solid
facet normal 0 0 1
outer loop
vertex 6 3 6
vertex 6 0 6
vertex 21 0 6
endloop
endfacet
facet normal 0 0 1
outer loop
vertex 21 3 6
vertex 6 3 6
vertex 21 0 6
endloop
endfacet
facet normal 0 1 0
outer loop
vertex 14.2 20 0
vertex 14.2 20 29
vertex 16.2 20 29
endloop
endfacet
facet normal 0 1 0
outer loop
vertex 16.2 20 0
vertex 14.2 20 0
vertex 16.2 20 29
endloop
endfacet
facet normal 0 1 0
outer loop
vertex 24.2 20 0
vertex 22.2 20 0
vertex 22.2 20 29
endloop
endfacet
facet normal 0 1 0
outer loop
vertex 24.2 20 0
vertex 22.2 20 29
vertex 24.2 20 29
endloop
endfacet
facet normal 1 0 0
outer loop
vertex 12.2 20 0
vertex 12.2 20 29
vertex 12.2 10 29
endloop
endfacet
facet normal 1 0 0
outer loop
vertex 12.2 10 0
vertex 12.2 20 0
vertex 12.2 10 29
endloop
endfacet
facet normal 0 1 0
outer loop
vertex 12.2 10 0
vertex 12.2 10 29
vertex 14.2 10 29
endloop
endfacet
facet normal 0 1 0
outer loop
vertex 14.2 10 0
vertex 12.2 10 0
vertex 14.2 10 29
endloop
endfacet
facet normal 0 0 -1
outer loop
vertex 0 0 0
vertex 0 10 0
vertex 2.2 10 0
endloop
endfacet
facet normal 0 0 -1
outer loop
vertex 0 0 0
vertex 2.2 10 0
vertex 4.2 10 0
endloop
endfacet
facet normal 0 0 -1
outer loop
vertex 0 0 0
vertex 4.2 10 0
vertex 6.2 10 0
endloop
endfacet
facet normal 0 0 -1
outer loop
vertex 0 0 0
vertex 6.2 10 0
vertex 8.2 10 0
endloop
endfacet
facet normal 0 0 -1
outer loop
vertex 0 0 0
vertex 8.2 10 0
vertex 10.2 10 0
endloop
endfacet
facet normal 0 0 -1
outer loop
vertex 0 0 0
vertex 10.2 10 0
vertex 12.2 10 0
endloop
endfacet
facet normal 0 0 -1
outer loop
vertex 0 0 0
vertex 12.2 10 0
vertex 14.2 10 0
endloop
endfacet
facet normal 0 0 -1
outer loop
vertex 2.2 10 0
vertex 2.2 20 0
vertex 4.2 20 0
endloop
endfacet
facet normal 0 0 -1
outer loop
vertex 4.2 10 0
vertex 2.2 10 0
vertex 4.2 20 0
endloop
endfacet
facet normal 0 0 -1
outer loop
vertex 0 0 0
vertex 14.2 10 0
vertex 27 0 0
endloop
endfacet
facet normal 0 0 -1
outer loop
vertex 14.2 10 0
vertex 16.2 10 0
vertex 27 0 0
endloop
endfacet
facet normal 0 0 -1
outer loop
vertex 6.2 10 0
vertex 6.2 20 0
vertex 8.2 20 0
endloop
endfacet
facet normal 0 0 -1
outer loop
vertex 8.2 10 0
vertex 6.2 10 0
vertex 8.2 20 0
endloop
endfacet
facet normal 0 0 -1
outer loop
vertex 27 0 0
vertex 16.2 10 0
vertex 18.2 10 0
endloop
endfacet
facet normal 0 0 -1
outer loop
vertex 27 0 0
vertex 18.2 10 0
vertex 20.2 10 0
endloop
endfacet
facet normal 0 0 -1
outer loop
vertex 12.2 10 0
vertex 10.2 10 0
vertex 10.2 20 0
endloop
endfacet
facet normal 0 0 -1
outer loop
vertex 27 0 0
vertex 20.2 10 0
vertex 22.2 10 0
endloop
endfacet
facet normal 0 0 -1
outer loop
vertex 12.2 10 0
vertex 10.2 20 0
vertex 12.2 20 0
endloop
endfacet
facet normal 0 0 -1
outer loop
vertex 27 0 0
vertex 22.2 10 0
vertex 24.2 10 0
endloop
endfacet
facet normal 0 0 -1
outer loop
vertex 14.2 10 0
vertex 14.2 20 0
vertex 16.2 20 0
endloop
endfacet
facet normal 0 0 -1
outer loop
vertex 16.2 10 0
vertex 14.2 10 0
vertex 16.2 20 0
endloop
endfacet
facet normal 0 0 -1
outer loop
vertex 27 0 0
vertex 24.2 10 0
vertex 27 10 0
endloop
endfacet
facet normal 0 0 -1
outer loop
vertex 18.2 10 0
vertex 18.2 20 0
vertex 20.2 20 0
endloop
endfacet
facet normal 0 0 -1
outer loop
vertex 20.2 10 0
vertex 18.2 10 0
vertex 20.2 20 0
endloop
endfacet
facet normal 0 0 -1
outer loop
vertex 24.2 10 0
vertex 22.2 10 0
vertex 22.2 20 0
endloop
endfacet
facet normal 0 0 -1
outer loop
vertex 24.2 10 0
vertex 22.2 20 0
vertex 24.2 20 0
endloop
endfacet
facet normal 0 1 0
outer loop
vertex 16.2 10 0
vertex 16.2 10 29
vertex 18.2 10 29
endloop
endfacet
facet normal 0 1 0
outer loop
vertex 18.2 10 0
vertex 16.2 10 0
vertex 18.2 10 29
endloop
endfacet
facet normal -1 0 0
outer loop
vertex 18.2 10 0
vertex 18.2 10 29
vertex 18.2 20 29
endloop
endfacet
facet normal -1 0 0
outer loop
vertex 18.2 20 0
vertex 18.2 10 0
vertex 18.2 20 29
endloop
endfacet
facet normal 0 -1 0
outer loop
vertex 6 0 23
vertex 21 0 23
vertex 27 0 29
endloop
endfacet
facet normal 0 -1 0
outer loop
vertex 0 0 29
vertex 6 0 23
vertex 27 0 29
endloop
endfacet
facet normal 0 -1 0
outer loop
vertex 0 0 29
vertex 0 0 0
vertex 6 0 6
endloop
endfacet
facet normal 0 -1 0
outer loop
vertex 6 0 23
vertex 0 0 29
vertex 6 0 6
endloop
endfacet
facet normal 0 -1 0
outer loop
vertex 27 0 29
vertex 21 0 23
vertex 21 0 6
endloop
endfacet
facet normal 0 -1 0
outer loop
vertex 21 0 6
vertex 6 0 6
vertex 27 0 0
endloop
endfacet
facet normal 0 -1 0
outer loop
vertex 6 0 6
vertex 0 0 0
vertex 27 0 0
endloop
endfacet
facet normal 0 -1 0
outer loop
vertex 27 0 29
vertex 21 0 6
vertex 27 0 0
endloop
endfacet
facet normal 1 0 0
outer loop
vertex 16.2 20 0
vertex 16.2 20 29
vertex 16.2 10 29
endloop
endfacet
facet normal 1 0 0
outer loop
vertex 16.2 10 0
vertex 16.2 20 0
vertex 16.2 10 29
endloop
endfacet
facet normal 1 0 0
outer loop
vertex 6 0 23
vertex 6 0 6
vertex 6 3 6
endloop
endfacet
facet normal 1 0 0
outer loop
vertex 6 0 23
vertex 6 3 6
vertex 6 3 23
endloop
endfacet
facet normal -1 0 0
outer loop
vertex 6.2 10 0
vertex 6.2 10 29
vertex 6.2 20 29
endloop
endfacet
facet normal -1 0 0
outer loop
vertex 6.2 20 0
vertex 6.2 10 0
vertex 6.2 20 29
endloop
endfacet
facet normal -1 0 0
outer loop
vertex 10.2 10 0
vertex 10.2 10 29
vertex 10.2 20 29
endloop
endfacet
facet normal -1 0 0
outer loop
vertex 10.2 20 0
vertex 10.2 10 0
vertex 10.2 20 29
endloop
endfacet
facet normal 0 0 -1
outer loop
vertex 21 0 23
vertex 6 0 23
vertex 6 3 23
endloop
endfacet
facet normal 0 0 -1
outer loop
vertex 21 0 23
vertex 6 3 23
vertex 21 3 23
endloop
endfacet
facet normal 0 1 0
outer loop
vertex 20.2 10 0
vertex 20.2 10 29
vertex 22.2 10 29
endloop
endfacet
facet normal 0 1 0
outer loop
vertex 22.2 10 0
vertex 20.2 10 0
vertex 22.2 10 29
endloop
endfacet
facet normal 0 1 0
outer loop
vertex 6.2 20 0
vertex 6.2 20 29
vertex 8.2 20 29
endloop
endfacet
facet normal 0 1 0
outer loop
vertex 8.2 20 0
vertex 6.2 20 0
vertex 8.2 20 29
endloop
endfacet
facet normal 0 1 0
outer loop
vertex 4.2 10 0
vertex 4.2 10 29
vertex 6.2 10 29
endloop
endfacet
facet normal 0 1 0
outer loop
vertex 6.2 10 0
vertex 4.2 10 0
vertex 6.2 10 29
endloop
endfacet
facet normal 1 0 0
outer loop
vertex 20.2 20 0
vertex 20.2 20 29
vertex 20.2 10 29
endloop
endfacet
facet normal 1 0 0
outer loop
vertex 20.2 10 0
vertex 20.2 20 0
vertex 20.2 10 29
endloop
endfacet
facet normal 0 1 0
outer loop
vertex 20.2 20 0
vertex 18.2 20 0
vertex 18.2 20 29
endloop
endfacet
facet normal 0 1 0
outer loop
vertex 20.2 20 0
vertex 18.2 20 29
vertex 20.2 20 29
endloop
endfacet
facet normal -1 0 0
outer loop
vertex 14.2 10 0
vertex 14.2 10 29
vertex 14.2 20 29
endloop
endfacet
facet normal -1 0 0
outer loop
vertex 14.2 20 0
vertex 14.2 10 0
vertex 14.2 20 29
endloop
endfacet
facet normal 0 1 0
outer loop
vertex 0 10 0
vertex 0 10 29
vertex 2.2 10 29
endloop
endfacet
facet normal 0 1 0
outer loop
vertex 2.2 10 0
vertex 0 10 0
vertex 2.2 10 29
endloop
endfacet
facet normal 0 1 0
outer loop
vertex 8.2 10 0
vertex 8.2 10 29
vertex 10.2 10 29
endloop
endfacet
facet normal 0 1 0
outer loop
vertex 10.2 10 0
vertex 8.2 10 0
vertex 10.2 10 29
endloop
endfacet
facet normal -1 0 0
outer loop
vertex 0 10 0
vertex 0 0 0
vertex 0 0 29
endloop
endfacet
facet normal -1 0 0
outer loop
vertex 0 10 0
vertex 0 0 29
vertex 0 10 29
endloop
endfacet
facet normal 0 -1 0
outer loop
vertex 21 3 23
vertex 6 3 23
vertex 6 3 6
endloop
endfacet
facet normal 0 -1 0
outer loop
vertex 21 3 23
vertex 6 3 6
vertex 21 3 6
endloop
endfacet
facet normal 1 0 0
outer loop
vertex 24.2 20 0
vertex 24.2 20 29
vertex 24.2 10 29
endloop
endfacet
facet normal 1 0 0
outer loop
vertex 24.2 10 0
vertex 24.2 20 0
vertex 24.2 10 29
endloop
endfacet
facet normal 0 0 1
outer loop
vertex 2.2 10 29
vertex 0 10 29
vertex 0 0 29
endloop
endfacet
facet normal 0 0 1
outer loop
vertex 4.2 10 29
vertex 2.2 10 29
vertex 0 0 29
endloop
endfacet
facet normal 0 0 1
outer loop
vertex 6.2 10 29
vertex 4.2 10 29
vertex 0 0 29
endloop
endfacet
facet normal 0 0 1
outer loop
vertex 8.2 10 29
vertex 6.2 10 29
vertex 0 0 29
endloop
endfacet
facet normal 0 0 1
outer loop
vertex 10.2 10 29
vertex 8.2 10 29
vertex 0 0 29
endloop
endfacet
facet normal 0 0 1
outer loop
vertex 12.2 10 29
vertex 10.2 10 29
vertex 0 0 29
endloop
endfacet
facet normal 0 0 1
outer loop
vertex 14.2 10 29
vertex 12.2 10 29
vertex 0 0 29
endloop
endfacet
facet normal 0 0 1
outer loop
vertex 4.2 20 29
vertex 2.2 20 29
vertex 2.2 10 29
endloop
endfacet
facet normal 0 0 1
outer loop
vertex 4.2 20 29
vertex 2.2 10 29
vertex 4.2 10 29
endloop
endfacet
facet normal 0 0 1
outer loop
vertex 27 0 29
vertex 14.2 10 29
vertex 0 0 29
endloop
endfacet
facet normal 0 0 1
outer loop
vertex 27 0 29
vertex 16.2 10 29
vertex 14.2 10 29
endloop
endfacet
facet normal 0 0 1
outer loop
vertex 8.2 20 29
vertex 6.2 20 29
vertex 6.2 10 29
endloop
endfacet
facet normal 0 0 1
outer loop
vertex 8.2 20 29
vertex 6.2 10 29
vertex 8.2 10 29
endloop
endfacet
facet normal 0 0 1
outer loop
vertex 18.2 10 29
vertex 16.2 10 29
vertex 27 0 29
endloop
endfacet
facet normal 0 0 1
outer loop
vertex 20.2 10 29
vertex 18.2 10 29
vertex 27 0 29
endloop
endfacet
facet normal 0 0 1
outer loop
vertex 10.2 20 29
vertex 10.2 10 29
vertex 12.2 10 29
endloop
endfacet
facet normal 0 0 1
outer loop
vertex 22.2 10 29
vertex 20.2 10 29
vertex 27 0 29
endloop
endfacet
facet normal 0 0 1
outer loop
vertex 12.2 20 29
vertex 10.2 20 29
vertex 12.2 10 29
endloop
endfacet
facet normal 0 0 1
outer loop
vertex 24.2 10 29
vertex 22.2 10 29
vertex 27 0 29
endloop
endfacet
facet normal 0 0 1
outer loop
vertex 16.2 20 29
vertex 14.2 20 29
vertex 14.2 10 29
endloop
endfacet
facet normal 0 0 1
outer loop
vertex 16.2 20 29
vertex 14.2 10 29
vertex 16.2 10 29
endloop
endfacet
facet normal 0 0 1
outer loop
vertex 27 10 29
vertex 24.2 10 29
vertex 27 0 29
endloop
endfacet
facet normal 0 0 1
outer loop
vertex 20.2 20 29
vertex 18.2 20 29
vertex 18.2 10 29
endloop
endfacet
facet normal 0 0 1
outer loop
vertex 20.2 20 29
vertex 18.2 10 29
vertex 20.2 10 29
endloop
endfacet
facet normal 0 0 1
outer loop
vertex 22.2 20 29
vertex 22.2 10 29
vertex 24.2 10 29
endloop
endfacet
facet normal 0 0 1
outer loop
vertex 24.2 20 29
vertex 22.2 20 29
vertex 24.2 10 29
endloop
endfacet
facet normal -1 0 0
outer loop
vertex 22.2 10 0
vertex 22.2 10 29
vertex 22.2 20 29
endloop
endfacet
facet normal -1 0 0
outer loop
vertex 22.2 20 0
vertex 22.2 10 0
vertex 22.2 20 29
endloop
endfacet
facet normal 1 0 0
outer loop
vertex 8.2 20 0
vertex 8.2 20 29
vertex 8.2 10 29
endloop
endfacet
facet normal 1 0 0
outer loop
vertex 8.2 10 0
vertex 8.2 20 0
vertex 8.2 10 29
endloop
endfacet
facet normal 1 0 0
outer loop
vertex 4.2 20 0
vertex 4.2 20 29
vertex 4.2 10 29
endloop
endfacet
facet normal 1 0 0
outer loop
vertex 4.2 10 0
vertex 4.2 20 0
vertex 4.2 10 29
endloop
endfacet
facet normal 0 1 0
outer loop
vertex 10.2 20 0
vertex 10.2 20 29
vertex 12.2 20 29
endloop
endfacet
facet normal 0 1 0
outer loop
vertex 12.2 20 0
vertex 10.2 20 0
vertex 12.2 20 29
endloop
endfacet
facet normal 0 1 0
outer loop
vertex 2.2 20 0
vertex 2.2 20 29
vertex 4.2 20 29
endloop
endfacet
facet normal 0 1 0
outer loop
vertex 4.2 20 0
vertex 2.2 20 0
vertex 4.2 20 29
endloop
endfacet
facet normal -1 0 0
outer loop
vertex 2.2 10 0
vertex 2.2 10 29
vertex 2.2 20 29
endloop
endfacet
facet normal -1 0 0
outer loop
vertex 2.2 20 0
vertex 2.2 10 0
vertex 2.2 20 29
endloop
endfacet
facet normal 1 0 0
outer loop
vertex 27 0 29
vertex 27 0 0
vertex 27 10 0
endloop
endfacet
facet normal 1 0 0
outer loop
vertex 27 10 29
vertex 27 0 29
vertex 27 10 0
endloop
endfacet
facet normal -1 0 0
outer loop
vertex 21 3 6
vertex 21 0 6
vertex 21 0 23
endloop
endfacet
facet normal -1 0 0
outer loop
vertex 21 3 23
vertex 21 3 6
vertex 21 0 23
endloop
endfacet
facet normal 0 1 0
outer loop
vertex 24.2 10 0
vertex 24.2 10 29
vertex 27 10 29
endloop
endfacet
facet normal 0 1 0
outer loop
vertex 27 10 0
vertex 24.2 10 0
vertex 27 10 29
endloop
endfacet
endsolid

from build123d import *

# Parameters (mm, degrees)
F0_W     = 27
F0_H     = 20
F1_DEPTH = 29
F3_DEPTH = 29.001
F4_W     = 15
F4_H     = 17
F5_DEPTH = 3


with BuildPart() as f1:
    # F0 (on Top) → F1 (new body)
    with BuildSketch(Plane.XY):
        with Locations((13.5, 10)):
            Rectangle(F0_W, F0_H)
    extrude(amount=F1_DEPTH)

    # F2 (on face) → F3 (cut, through all)
    with BuildSketch(Plane.XY.offset(29)):
        Polygon((-5.87794, 25.212042), (-5.66129, 10), (2.2, 10), (2.2, 21), (4.2, 21), (4.2, 10), (6.2, 10), (6.2, 21), (8.2, 21), (8.2, 10), (10.2, 10), (10.2, 21), (12.2, 21), (12.2, 10), (14.2, 10), (14.2, 21), (16.2, 21), (16.2, 10), (18.2, 10), (18.2, 21), (20.2, 21), (20.2, 10), (22.2, 10), (22.2, 21), (24.2, 21), (24.2, 10), (26.2, 10), (30.417973, 10), (30.417973, 25.212042), align=None)
    extrude(amount=-F3_DEPTH, mode=Mode.SUBTRACT)

    # F4 (on face) → F5 (cut)
    with BuildSketch(Plane.XZ):
        with Locations((13.5, 14.5)):
            Rectangle(F4_W, F4_H)
    extrude(amount=-F5_DEPTH, mode=Mode.SUBTRACT)


solid = f1.part
